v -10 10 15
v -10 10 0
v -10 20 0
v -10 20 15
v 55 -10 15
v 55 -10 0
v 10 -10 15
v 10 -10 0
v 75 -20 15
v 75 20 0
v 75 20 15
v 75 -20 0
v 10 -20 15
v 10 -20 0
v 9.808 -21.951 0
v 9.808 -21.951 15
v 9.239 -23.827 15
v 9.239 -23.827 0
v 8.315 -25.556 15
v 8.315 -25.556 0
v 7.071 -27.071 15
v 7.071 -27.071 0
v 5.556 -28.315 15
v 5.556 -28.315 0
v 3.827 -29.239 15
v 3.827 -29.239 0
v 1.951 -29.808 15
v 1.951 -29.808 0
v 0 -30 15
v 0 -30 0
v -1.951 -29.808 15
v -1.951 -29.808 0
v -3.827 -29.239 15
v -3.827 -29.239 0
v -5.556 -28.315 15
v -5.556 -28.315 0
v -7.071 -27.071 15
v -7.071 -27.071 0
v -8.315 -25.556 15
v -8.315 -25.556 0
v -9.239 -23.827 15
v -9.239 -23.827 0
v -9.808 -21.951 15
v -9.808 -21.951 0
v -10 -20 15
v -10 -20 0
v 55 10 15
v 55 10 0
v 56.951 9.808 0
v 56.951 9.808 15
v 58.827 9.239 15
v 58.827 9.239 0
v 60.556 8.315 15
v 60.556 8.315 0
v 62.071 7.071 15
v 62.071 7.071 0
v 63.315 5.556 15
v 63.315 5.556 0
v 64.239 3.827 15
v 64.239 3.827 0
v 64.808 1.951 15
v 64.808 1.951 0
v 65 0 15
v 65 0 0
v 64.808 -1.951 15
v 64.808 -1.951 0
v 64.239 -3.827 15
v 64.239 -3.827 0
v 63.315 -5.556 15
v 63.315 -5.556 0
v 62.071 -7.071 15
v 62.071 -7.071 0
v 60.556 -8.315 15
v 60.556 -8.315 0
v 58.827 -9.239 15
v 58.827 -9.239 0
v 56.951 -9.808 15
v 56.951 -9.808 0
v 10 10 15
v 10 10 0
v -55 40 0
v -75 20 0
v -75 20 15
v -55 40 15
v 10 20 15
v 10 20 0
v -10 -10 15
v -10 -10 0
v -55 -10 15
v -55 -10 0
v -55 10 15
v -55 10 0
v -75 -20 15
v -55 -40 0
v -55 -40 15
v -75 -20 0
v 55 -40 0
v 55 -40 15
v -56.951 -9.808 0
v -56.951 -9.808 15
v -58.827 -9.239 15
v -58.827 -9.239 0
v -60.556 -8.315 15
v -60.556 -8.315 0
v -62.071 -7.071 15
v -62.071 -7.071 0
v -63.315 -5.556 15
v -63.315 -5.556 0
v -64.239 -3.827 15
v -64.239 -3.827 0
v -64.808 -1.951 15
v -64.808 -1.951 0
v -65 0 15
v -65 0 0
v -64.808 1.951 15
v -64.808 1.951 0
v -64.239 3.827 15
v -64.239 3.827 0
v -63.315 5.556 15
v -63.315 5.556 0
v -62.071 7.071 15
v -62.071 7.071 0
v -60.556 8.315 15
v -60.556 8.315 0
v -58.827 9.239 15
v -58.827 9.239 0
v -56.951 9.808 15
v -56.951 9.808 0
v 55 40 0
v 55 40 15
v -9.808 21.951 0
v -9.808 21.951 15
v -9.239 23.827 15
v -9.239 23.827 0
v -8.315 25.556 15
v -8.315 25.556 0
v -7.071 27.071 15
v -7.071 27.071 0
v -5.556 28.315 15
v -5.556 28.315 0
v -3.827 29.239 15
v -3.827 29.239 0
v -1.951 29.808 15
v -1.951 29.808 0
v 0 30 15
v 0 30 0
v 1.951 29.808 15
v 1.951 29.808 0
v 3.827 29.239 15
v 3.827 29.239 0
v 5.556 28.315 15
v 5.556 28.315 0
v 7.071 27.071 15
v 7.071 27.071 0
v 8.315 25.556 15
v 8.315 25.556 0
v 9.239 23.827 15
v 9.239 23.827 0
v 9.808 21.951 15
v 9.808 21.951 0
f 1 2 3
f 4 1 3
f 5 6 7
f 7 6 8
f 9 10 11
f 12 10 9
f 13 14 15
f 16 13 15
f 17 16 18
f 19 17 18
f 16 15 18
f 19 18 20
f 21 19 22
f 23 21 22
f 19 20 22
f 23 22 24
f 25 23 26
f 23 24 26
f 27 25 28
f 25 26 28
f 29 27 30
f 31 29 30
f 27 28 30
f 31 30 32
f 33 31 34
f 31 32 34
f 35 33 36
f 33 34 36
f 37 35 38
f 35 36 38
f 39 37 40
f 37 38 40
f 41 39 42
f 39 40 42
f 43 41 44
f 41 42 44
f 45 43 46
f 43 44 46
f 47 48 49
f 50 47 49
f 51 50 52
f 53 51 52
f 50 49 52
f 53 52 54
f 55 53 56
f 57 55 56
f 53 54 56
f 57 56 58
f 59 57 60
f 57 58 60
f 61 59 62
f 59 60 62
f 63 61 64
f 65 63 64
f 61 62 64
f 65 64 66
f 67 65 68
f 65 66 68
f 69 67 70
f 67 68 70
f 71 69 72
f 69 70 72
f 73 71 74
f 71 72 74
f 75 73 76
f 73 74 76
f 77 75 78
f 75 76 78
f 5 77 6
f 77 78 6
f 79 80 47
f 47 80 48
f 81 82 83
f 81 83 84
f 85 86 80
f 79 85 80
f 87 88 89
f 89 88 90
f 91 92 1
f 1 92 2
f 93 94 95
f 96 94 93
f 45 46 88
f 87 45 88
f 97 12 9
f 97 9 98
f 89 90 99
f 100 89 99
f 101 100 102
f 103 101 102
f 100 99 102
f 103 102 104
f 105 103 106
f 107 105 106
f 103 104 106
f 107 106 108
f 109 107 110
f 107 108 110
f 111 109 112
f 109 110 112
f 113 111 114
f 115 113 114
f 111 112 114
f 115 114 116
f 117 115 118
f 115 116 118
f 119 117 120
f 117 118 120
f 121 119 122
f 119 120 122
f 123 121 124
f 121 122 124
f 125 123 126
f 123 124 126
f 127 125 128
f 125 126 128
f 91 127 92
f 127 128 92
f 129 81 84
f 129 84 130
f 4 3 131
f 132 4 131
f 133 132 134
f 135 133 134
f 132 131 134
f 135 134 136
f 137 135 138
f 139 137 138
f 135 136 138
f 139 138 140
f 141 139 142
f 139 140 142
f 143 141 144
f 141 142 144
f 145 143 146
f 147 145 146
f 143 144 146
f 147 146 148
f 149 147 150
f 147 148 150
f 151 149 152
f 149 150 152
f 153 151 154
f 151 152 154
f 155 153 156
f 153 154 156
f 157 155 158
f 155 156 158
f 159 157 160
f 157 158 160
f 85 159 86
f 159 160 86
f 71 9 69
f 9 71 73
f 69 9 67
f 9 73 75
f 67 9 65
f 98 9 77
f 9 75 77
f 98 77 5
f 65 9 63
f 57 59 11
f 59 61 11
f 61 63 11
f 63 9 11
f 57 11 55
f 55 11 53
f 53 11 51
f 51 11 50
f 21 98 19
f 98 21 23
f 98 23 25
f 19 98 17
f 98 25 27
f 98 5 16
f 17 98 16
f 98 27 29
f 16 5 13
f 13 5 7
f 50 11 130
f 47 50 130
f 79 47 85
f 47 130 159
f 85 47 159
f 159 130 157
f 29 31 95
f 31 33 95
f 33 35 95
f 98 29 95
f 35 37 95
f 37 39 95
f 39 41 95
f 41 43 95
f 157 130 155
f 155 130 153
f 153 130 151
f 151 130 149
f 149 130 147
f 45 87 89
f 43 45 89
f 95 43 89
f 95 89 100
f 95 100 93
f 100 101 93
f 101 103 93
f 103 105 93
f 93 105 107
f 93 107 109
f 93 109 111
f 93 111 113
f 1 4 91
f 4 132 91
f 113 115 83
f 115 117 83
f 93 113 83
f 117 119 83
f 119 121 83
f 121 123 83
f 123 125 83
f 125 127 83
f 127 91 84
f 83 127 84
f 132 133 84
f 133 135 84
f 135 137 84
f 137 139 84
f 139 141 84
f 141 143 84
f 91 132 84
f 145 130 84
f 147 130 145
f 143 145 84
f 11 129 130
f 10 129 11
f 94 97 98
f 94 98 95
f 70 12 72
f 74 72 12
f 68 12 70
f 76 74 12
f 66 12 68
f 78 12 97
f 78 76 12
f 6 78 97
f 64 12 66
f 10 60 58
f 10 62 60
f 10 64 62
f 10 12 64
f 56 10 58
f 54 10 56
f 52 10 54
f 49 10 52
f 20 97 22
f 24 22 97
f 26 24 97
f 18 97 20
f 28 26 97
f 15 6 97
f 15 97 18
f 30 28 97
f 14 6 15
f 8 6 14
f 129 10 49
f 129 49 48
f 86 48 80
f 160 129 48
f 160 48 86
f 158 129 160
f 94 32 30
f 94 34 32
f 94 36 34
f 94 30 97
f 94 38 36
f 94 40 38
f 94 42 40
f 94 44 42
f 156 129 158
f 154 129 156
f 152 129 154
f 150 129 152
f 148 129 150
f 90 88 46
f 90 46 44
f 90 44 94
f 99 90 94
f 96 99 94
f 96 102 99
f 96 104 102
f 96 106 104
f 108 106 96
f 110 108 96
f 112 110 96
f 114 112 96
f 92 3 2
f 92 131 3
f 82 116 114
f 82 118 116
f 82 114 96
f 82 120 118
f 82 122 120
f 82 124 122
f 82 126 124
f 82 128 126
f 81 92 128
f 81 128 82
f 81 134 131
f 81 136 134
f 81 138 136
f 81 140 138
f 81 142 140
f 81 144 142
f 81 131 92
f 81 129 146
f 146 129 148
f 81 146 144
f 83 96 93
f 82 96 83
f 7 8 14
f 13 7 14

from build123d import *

# Parameters (mm, degrees)
BOSS_EXTRUDE1_DEPTH = 15


with BuildPart() as part:
    # Sketch1 → Boss-Extrude1 (new body)
    with BuildSketch(Plane.XY):
        Polygon((-75, 20), (-55, 40), (55, 40), (75, 20), (75, -20), (55, -40), (-55, -40), (-75, -20), align=None)
        with BuildLine():
            Line((-10, 10), (-10, 20))
            ThreePointArc((-10, 20), (0, 30), (10, 20))
            Line((10, 20), (10, 10))
            Line((10, 10), (55, 10))
            ThreePointArc((55, 10), (65, 0), (55, -10))
            Line((55, -10), (10, -10))
            Line((10, -10), (10, -20))
            ThreePointArc((10, -20), (0, -30), (-10, -20))
            Line((-10, -20), (-10, -10))
            Line((-10, -10), (-55, -10))
            ThreePointArc((-55, -10), (-65, 0), (-55, 10))
            Line((-55, 10), (-10, 10))
        make_face(mode=Mode.SUBTRACT)
    extrude(amount=BOSS_EXTRUDE1_DEPTH)


solid = part.part
